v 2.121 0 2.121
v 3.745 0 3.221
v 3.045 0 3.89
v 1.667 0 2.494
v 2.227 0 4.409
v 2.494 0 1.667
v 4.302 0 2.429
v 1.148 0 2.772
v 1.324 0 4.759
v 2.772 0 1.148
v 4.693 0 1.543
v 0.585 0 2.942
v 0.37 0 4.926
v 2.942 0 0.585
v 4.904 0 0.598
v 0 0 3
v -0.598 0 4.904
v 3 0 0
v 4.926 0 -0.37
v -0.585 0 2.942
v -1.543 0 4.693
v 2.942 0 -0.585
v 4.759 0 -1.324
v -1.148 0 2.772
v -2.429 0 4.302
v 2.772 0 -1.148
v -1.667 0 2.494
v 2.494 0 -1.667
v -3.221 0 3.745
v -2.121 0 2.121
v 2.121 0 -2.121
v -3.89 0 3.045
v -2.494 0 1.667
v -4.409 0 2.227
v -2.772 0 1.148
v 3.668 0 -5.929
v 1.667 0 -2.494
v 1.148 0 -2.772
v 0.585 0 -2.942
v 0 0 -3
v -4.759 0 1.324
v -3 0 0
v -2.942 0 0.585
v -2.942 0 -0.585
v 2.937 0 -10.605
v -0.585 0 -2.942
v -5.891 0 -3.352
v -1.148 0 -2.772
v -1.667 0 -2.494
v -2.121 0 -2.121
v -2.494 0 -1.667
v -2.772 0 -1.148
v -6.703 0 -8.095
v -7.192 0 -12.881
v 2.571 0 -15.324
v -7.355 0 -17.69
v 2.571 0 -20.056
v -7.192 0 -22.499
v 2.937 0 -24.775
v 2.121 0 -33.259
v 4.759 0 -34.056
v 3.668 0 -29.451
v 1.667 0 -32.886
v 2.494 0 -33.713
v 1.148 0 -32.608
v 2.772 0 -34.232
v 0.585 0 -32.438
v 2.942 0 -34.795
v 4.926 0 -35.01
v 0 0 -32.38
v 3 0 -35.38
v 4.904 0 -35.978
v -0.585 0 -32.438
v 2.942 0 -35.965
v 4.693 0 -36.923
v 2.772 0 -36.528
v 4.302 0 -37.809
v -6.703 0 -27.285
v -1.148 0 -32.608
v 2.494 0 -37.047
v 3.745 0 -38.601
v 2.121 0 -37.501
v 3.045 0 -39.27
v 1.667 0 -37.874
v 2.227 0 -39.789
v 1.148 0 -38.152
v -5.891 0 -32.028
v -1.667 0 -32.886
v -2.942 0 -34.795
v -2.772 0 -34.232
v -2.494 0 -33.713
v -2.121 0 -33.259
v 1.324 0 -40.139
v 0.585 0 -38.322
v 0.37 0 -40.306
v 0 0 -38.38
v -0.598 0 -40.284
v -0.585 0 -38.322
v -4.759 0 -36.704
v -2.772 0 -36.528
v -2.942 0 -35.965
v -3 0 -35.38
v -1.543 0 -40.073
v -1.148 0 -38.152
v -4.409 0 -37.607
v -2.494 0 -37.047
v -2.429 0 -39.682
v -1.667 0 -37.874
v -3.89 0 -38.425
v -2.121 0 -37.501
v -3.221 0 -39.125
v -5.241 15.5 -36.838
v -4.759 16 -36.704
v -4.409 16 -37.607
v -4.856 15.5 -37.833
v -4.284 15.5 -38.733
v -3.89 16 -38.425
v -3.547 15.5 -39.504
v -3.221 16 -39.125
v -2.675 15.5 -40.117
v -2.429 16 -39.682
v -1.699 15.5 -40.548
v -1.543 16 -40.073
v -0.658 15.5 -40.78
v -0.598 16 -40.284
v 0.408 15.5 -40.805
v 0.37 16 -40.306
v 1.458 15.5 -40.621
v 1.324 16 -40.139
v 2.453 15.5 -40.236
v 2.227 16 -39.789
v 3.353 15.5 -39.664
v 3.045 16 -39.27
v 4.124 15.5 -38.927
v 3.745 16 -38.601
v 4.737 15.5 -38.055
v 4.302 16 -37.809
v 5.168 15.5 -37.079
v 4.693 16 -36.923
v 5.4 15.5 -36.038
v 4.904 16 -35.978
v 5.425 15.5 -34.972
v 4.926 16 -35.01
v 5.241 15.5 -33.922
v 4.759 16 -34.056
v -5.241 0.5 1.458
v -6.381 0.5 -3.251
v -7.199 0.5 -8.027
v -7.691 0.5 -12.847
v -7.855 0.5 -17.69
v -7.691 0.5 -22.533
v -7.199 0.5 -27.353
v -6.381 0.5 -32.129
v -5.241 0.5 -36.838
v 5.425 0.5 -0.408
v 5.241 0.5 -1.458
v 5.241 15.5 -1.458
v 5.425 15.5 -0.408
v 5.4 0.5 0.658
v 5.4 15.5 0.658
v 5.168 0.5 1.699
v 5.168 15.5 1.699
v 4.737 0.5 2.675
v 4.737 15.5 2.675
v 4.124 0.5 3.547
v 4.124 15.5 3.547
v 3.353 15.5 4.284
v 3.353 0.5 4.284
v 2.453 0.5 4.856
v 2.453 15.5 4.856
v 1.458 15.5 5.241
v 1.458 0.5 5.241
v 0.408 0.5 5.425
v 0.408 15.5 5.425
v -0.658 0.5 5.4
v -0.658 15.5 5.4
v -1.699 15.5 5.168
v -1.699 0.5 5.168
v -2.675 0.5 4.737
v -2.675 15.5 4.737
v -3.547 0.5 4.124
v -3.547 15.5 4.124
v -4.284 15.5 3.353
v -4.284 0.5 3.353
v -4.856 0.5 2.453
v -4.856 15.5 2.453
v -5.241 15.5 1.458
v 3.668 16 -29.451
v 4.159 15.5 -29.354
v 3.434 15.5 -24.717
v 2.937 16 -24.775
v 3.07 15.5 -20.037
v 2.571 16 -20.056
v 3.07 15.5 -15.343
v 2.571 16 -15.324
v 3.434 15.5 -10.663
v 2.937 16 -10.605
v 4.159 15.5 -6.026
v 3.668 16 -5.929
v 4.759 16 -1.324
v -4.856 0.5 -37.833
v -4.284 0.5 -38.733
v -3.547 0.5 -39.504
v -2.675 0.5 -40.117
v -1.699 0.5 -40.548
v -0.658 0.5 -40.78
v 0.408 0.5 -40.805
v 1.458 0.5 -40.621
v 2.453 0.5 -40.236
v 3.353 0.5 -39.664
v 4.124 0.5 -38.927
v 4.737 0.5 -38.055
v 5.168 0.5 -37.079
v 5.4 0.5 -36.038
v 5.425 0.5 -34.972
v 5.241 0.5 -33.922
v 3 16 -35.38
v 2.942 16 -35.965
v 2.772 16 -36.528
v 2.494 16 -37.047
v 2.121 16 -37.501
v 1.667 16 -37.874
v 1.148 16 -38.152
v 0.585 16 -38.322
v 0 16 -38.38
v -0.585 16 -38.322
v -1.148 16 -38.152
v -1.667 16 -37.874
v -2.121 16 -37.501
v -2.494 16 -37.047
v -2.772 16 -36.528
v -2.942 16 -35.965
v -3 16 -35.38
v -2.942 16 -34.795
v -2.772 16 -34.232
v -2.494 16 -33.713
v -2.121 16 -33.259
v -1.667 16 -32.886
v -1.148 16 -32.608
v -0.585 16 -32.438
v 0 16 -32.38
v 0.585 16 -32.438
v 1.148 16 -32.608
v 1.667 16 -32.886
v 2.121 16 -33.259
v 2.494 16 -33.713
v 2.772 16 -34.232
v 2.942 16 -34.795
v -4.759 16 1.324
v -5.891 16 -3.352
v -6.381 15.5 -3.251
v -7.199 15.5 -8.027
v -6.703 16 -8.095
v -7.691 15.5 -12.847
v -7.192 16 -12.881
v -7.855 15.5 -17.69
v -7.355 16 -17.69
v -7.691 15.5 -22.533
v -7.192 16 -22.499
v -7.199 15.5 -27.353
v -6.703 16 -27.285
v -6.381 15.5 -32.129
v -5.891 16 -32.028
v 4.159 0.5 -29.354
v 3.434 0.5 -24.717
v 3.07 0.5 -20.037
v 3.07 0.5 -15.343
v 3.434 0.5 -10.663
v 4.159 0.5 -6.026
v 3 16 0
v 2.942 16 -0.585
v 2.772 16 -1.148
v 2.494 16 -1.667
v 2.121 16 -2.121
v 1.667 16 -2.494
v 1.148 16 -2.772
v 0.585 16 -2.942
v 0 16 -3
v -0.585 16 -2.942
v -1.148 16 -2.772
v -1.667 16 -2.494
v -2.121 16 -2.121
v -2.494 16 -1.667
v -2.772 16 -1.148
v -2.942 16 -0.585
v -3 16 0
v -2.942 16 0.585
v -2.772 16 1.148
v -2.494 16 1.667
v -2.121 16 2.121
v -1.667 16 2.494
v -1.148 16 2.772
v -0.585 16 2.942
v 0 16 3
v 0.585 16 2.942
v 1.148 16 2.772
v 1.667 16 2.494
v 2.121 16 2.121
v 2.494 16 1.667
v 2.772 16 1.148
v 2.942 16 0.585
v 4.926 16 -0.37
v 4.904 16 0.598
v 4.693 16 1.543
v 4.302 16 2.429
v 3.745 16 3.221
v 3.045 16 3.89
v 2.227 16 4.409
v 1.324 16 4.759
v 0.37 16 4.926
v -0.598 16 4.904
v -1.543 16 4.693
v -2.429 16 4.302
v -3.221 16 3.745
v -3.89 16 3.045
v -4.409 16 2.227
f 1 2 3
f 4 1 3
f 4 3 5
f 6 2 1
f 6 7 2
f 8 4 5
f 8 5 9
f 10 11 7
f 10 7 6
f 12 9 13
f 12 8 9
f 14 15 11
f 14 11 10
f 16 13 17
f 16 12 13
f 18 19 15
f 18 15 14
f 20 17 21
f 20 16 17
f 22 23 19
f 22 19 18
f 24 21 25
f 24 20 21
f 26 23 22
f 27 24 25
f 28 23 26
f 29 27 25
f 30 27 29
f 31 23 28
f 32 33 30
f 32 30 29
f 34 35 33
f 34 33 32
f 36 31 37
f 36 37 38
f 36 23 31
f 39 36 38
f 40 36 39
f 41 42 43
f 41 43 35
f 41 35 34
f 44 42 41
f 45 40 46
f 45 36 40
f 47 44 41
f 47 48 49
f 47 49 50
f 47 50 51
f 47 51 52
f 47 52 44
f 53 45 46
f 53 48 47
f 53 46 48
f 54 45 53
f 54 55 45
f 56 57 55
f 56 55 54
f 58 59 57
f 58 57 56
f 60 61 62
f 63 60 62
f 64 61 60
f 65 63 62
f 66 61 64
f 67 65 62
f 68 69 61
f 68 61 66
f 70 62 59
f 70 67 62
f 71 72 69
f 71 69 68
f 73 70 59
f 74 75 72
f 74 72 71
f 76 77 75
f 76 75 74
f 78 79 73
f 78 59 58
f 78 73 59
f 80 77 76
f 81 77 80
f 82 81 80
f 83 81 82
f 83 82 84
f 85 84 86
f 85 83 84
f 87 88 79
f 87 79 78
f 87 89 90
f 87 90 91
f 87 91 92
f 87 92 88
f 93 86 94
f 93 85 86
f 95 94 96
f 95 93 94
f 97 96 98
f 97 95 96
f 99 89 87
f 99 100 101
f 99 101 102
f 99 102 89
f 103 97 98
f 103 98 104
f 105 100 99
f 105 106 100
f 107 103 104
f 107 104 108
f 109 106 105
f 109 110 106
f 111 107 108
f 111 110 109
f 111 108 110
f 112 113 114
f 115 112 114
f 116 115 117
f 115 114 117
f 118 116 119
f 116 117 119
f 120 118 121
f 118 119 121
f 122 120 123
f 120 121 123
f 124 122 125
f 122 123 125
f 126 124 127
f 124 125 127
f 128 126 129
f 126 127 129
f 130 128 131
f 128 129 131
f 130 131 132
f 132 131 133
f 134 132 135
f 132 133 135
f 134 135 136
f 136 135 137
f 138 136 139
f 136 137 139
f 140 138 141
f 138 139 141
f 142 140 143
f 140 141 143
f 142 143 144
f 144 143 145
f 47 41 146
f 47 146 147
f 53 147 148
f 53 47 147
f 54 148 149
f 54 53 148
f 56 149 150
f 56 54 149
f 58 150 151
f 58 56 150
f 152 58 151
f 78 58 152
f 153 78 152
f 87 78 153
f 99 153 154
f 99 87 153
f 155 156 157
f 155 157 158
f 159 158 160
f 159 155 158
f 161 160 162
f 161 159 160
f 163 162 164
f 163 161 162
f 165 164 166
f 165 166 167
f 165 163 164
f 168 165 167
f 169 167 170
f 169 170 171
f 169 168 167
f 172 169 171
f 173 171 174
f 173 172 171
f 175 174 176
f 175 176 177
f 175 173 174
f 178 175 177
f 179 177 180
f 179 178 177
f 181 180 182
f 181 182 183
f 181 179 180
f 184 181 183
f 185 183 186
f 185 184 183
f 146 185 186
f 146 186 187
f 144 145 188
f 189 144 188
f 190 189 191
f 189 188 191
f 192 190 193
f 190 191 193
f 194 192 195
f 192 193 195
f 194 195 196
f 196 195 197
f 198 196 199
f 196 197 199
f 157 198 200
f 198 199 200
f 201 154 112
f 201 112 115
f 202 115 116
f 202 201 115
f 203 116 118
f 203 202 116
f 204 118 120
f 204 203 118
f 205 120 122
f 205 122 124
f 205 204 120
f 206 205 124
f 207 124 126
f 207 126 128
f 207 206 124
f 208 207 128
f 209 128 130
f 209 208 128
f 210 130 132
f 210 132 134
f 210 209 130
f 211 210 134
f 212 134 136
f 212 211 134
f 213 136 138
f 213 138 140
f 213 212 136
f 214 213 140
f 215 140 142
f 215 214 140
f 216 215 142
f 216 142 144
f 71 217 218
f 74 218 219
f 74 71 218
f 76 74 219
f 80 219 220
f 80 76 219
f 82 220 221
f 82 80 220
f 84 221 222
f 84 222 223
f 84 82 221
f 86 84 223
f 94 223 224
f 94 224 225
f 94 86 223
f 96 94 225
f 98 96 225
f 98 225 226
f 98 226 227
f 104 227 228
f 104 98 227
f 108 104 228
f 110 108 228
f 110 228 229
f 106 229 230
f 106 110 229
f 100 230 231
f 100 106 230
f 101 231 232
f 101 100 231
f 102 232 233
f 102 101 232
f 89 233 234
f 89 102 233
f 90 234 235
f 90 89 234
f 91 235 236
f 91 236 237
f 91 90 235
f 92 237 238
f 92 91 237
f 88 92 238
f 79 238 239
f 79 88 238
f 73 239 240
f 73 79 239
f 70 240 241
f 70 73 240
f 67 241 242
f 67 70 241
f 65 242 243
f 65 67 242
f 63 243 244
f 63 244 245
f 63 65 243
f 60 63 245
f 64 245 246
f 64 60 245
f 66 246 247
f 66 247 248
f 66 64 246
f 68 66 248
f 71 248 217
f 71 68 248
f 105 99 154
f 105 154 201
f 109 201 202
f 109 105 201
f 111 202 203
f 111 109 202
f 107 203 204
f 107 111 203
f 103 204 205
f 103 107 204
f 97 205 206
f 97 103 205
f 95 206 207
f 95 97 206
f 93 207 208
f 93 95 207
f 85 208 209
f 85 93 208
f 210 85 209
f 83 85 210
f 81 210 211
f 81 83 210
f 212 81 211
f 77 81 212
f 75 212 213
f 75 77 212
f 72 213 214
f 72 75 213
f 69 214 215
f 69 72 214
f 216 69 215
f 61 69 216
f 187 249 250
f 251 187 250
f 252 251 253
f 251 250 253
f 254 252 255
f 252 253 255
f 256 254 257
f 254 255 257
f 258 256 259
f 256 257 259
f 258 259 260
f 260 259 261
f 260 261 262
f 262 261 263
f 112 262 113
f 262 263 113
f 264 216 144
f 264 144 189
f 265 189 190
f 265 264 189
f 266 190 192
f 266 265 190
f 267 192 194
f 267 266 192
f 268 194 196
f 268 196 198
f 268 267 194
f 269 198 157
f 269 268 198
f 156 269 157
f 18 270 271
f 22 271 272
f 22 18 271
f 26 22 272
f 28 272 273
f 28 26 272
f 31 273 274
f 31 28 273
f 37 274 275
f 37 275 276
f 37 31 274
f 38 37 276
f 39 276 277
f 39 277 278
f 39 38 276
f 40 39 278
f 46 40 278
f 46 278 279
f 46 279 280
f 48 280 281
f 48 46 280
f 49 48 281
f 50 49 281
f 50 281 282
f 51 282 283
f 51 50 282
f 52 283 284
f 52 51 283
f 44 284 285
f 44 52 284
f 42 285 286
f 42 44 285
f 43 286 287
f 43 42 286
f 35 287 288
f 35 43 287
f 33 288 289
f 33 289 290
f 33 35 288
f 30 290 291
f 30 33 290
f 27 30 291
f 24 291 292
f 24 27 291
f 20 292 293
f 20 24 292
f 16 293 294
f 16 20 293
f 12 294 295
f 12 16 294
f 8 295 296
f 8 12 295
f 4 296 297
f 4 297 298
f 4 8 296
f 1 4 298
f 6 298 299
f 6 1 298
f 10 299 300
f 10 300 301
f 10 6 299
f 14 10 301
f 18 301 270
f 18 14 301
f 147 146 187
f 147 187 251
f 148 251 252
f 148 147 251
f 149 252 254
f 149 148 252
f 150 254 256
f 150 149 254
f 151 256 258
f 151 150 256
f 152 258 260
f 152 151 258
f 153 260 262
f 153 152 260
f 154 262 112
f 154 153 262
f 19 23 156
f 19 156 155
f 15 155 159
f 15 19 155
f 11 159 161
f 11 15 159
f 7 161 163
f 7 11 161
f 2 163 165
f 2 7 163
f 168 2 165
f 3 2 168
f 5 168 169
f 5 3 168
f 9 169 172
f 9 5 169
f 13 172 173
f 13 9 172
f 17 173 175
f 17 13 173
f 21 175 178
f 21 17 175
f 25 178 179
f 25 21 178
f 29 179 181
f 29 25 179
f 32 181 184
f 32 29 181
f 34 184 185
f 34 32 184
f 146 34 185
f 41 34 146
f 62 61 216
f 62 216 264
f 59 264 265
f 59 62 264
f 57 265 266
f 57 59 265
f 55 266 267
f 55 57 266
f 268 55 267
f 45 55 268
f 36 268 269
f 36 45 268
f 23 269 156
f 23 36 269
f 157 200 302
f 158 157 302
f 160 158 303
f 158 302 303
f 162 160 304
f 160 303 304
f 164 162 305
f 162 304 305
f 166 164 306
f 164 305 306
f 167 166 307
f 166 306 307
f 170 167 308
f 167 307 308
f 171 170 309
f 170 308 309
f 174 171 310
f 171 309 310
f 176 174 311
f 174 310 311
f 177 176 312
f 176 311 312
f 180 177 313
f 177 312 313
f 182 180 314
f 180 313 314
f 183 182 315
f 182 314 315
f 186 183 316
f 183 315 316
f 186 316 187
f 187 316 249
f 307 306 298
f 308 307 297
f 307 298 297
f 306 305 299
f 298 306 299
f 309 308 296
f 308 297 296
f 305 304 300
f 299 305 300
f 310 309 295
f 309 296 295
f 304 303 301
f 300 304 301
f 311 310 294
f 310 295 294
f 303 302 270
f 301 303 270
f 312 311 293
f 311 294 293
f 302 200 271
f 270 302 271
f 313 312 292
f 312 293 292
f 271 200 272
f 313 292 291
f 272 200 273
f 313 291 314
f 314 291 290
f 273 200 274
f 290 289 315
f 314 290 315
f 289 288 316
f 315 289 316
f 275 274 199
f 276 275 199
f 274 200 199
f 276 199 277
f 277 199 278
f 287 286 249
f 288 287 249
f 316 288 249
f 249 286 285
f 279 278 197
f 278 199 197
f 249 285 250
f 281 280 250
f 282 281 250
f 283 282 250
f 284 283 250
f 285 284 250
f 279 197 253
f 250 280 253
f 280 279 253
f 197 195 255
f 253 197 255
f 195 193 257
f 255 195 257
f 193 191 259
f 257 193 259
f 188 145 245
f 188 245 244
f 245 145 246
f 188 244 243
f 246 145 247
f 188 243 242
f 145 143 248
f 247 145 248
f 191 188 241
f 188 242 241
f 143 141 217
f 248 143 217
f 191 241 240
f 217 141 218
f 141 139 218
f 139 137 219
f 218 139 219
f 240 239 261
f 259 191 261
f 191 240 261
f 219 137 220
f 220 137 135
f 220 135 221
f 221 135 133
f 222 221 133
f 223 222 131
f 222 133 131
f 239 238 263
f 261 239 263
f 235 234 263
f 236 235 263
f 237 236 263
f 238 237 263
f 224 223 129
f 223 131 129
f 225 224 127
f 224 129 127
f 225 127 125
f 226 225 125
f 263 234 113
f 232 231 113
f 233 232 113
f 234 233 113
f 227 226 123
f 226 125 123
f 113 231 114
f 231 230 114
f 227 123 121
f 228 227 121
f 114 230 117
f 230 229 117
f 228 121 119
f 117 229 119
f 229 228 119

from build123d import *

# Parameters (mm, degrees)
SKETCH_1_R      = 3
EXTRUDE_1_DEPTH = 16
CHAMFER_1_SIZE  = 0.5


with BuildPart() as part:
    # 草图1 → 凸台-拉伸1 (new body)
    with BuildSketch(Plane(origin=(0, 0, 0), x_dir=(1, 0, 0), z_dir=(0, 1, 0))):
        with BuildLine():
            ThreePointArc((-5.240891545, 36.838305804), (1.458305804, 40.620891545), (5.240891545, 33.921694196))
            ThreePointArc((5.240891545, 33.921694196), (3.024711954, 17.69), (5.240891545, 1.458305804))
            ThreePointArc((5.240891545, 1.458305804), (1.458305804, -5.240891545), (-5.240891545, -1.458305804))
            ThreePointArc((-5.240891545, -1.458305804), (-7.855288046, 17.69), (-5.240891545, 36.838305804))
        make_face()
        Circle(SKETCH_1_R, mode=Mode.SUBTRACT)
        with Locations((0, 35.38)):
            Circle(SKETCH_1_R, mode=Mode.SUBTRACT)
    extrude(amount=EXTRUDE_1_DEPTH)

    # 倒角1
    chamfer_1_edges = [part.edges().sort_by_distance(p)[0] for p in [
        (3.024711954, 16, -17.69),
        (1.458305804, 16, -40.620891545),
        (-7.855288046, 16, -17.69),
        (1.458305804, 0, -40.620891545),
        (3.024711954, 0, -17.69),
        (1.458305804, 0, 5.240891545),
        (-7.855288046, 0, -17.69),
        (1.458305804, 16, 5.240891545),
    ]]
    chamfer(chamfer_1_edges, length=CHAMFER_1_SIZE)


solid = part.part
